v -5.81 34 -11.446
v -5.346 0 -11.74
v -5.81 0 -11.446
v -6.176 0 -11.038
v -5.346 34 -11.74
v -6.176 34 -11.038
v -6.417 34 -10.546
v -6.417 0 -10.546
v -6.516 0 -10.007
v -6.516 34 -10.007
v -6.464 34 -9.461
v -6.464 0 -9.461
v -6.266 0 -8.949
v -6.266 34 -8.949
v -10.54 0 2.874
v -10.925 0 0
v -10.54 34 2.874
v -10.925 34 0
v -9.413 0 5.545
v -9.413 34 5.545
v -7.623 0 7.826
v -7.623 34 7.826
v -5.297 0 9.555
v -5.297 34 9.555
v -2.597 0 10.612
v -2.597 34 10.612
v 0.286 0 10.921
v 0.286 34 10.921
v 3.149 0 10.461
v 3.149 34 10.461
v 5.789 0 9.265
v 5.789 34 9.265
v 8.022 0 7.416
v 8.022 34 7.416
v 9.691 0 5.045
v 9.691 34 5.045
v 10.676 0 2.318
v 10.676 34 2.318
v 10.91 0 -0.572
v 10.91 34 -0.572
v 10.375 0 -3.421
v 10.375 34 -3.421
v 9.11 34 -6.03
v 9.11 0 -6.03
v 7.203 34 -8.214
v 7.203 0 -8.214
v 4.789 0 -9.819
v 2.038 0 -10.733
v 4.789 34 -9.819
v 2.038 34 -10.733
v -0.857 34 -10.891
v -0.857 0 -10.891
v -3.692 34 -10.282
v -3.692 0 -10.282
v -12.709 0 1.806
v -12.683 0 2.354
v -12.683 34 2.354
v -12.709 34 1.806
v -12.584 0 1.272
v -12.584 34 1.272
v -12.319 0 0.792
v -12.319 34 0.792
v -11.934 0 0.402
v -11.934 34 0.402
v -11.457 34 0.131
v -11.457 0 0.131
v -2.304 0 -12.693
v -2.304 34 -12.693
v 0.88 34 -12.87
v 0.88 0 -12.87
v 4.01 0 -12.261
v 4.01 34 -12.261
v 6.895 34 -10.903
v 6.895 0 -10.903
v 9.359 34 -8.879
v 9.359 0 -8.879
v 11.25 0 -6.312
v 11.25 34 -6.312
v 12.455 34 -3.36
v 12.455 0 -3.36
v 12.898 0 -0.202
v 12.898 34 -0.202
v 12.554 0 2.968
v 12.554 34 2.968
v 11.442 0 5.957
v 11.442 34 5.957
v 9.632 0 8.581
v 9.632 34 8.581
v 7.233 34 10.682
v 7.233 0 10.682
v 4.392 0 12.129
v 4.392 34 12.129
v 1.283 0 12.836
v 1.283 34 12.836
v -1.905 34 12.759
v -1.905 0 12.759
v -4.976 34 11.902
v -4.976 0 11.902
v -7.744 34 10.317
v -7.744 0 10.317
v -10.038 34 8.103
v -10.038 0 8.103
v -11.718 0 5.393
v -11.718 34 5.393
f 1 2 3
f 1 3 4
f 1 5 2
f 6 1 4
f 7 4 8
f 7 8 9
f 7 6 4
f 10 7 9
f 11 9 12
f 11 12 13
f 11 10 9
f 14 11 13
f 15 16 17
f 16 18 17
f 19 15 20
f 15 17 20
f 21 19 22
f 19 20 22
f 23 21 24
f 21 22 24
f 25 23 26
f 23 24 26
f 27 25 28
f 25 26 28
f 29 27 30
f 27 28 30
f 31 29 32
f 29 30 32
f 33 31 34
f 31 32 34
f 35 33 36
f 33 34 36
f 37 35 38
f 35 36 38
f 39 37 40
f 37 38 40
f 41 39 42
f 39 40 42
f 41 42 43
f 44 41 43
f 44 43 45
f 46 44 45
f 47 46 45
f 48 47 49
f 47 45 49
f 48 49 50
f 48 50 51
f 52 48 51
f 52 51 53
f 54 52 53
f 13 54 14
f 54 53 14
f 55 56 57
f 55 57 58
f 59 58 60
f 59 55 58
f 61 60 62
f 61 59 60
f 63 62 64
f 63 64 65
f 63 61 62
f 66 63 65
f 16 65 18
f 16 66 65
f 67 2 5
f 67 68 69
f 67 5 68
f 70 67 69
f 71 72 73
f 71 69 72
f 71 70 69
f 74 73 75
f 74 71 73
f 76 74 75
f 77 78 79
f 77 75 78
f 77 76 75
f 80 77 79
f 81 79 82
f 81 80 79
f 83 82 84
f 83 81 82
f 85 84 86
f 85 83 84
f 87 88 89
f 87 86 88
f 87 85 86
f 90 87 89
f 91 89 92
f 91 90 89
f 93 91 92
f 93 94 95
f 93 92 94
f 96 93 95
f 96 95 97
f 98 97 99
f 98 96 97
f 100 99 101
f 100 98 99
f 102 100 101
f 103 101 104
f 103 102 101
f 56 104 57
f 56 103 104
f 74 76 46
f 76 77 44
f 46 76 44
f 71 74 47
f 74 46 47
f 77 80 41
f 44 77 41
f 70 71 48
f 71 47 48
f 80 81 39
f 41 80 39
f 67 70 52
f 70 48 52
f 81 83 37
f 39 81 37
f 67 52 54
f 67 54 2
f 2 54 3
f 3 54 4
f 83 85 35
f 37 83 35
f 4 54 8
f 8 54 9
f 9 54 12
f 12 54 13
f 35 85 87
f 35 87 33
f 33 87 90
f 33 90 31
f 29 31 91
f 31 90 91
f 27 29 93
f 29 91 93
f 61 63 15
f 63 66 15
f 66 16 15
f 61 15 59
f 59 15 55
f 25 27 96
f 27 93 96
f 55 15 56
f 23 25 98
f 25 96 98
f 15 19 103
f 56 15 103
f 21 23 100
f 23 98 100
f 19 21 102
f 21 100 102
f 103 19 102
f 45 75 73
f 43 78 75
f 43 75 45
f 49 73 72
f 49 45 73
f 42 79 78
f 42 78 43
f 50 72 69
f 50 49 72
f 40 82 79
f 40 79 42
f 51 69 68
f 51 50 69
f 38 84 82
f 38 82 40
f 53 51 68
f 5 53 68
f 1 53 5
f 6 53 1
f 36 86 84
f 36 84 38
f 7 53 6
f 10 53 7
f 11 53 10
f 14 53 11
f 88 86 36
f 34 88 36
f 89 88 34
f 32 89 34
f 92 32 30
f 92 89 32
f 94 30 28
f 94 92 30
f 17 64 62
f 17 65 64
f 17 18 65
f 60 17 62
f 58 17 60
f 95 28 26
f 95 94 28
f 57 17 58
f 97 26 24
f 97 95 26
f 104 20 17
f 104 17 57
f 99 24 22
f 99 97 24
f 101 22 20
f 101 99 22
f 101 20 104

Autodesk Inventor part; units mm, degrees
ref_plane "YZ Plane" through (0, 0, 0) normal (1, 0, 0) x (0, 1, 0)
ref_plane "XZ Plane" through (0, 0, 0) normal (0, 1, 0) x (-1, 0, 0)
ref_plane "XY Plane" through (0, 0, 0) normal (0, 0, 1) x (1, 0, 0)
sketch "Sketch1" plane through (0, 0, 0) normal (0, 1, 0) x (-1, 0, 0)
  circle A0 centre (0, 0) radius 12.9
  dimension "d0" = 25.8
extrude "Extrusion1" add sketch "Sketch1" along normal blind 34
sketch "Sketch2" plane through (0, 34, 0) normal (0, 1, 0) x (1, 0, 0)
  circle A0 centre (0, 0) radius 10.925
  dimension "d3" = 21.85
extrude "Extrusion2" cut sketch "Sketch2" against normal through all
sketch "Sketch3" plane through (0, 34, 0) normal (0, 1, 0) x (1, 0, 0)
  circle A0 centre (0, 0) radius 12.9 projected
  arc A1 (-7.3991, 10.5671) -> (-12.9, 0) centre (0, 0) ccw
  line L0 (0, 0) -> (-7.3991, 10.5671) construction
  line L1 (0, 0) -> (-12.9, 0) construction
  line L2 (-12.9, 0) -> (0, 0)
  line L3 (0, 0) -> (-7.3991, 10.5671)
  dimension "d6" = 55
extrude "Extrusion3" cut sketch "Sketch3" against normal through all contours L3 L2 A0 picked at (-5.6993, 6.3576)
fillet "Fillet1" radius 2 2 edges at (-12.9, 17, 0) (-7.3991, 17, -10.5671)
properties part number "flute-wrapper"
